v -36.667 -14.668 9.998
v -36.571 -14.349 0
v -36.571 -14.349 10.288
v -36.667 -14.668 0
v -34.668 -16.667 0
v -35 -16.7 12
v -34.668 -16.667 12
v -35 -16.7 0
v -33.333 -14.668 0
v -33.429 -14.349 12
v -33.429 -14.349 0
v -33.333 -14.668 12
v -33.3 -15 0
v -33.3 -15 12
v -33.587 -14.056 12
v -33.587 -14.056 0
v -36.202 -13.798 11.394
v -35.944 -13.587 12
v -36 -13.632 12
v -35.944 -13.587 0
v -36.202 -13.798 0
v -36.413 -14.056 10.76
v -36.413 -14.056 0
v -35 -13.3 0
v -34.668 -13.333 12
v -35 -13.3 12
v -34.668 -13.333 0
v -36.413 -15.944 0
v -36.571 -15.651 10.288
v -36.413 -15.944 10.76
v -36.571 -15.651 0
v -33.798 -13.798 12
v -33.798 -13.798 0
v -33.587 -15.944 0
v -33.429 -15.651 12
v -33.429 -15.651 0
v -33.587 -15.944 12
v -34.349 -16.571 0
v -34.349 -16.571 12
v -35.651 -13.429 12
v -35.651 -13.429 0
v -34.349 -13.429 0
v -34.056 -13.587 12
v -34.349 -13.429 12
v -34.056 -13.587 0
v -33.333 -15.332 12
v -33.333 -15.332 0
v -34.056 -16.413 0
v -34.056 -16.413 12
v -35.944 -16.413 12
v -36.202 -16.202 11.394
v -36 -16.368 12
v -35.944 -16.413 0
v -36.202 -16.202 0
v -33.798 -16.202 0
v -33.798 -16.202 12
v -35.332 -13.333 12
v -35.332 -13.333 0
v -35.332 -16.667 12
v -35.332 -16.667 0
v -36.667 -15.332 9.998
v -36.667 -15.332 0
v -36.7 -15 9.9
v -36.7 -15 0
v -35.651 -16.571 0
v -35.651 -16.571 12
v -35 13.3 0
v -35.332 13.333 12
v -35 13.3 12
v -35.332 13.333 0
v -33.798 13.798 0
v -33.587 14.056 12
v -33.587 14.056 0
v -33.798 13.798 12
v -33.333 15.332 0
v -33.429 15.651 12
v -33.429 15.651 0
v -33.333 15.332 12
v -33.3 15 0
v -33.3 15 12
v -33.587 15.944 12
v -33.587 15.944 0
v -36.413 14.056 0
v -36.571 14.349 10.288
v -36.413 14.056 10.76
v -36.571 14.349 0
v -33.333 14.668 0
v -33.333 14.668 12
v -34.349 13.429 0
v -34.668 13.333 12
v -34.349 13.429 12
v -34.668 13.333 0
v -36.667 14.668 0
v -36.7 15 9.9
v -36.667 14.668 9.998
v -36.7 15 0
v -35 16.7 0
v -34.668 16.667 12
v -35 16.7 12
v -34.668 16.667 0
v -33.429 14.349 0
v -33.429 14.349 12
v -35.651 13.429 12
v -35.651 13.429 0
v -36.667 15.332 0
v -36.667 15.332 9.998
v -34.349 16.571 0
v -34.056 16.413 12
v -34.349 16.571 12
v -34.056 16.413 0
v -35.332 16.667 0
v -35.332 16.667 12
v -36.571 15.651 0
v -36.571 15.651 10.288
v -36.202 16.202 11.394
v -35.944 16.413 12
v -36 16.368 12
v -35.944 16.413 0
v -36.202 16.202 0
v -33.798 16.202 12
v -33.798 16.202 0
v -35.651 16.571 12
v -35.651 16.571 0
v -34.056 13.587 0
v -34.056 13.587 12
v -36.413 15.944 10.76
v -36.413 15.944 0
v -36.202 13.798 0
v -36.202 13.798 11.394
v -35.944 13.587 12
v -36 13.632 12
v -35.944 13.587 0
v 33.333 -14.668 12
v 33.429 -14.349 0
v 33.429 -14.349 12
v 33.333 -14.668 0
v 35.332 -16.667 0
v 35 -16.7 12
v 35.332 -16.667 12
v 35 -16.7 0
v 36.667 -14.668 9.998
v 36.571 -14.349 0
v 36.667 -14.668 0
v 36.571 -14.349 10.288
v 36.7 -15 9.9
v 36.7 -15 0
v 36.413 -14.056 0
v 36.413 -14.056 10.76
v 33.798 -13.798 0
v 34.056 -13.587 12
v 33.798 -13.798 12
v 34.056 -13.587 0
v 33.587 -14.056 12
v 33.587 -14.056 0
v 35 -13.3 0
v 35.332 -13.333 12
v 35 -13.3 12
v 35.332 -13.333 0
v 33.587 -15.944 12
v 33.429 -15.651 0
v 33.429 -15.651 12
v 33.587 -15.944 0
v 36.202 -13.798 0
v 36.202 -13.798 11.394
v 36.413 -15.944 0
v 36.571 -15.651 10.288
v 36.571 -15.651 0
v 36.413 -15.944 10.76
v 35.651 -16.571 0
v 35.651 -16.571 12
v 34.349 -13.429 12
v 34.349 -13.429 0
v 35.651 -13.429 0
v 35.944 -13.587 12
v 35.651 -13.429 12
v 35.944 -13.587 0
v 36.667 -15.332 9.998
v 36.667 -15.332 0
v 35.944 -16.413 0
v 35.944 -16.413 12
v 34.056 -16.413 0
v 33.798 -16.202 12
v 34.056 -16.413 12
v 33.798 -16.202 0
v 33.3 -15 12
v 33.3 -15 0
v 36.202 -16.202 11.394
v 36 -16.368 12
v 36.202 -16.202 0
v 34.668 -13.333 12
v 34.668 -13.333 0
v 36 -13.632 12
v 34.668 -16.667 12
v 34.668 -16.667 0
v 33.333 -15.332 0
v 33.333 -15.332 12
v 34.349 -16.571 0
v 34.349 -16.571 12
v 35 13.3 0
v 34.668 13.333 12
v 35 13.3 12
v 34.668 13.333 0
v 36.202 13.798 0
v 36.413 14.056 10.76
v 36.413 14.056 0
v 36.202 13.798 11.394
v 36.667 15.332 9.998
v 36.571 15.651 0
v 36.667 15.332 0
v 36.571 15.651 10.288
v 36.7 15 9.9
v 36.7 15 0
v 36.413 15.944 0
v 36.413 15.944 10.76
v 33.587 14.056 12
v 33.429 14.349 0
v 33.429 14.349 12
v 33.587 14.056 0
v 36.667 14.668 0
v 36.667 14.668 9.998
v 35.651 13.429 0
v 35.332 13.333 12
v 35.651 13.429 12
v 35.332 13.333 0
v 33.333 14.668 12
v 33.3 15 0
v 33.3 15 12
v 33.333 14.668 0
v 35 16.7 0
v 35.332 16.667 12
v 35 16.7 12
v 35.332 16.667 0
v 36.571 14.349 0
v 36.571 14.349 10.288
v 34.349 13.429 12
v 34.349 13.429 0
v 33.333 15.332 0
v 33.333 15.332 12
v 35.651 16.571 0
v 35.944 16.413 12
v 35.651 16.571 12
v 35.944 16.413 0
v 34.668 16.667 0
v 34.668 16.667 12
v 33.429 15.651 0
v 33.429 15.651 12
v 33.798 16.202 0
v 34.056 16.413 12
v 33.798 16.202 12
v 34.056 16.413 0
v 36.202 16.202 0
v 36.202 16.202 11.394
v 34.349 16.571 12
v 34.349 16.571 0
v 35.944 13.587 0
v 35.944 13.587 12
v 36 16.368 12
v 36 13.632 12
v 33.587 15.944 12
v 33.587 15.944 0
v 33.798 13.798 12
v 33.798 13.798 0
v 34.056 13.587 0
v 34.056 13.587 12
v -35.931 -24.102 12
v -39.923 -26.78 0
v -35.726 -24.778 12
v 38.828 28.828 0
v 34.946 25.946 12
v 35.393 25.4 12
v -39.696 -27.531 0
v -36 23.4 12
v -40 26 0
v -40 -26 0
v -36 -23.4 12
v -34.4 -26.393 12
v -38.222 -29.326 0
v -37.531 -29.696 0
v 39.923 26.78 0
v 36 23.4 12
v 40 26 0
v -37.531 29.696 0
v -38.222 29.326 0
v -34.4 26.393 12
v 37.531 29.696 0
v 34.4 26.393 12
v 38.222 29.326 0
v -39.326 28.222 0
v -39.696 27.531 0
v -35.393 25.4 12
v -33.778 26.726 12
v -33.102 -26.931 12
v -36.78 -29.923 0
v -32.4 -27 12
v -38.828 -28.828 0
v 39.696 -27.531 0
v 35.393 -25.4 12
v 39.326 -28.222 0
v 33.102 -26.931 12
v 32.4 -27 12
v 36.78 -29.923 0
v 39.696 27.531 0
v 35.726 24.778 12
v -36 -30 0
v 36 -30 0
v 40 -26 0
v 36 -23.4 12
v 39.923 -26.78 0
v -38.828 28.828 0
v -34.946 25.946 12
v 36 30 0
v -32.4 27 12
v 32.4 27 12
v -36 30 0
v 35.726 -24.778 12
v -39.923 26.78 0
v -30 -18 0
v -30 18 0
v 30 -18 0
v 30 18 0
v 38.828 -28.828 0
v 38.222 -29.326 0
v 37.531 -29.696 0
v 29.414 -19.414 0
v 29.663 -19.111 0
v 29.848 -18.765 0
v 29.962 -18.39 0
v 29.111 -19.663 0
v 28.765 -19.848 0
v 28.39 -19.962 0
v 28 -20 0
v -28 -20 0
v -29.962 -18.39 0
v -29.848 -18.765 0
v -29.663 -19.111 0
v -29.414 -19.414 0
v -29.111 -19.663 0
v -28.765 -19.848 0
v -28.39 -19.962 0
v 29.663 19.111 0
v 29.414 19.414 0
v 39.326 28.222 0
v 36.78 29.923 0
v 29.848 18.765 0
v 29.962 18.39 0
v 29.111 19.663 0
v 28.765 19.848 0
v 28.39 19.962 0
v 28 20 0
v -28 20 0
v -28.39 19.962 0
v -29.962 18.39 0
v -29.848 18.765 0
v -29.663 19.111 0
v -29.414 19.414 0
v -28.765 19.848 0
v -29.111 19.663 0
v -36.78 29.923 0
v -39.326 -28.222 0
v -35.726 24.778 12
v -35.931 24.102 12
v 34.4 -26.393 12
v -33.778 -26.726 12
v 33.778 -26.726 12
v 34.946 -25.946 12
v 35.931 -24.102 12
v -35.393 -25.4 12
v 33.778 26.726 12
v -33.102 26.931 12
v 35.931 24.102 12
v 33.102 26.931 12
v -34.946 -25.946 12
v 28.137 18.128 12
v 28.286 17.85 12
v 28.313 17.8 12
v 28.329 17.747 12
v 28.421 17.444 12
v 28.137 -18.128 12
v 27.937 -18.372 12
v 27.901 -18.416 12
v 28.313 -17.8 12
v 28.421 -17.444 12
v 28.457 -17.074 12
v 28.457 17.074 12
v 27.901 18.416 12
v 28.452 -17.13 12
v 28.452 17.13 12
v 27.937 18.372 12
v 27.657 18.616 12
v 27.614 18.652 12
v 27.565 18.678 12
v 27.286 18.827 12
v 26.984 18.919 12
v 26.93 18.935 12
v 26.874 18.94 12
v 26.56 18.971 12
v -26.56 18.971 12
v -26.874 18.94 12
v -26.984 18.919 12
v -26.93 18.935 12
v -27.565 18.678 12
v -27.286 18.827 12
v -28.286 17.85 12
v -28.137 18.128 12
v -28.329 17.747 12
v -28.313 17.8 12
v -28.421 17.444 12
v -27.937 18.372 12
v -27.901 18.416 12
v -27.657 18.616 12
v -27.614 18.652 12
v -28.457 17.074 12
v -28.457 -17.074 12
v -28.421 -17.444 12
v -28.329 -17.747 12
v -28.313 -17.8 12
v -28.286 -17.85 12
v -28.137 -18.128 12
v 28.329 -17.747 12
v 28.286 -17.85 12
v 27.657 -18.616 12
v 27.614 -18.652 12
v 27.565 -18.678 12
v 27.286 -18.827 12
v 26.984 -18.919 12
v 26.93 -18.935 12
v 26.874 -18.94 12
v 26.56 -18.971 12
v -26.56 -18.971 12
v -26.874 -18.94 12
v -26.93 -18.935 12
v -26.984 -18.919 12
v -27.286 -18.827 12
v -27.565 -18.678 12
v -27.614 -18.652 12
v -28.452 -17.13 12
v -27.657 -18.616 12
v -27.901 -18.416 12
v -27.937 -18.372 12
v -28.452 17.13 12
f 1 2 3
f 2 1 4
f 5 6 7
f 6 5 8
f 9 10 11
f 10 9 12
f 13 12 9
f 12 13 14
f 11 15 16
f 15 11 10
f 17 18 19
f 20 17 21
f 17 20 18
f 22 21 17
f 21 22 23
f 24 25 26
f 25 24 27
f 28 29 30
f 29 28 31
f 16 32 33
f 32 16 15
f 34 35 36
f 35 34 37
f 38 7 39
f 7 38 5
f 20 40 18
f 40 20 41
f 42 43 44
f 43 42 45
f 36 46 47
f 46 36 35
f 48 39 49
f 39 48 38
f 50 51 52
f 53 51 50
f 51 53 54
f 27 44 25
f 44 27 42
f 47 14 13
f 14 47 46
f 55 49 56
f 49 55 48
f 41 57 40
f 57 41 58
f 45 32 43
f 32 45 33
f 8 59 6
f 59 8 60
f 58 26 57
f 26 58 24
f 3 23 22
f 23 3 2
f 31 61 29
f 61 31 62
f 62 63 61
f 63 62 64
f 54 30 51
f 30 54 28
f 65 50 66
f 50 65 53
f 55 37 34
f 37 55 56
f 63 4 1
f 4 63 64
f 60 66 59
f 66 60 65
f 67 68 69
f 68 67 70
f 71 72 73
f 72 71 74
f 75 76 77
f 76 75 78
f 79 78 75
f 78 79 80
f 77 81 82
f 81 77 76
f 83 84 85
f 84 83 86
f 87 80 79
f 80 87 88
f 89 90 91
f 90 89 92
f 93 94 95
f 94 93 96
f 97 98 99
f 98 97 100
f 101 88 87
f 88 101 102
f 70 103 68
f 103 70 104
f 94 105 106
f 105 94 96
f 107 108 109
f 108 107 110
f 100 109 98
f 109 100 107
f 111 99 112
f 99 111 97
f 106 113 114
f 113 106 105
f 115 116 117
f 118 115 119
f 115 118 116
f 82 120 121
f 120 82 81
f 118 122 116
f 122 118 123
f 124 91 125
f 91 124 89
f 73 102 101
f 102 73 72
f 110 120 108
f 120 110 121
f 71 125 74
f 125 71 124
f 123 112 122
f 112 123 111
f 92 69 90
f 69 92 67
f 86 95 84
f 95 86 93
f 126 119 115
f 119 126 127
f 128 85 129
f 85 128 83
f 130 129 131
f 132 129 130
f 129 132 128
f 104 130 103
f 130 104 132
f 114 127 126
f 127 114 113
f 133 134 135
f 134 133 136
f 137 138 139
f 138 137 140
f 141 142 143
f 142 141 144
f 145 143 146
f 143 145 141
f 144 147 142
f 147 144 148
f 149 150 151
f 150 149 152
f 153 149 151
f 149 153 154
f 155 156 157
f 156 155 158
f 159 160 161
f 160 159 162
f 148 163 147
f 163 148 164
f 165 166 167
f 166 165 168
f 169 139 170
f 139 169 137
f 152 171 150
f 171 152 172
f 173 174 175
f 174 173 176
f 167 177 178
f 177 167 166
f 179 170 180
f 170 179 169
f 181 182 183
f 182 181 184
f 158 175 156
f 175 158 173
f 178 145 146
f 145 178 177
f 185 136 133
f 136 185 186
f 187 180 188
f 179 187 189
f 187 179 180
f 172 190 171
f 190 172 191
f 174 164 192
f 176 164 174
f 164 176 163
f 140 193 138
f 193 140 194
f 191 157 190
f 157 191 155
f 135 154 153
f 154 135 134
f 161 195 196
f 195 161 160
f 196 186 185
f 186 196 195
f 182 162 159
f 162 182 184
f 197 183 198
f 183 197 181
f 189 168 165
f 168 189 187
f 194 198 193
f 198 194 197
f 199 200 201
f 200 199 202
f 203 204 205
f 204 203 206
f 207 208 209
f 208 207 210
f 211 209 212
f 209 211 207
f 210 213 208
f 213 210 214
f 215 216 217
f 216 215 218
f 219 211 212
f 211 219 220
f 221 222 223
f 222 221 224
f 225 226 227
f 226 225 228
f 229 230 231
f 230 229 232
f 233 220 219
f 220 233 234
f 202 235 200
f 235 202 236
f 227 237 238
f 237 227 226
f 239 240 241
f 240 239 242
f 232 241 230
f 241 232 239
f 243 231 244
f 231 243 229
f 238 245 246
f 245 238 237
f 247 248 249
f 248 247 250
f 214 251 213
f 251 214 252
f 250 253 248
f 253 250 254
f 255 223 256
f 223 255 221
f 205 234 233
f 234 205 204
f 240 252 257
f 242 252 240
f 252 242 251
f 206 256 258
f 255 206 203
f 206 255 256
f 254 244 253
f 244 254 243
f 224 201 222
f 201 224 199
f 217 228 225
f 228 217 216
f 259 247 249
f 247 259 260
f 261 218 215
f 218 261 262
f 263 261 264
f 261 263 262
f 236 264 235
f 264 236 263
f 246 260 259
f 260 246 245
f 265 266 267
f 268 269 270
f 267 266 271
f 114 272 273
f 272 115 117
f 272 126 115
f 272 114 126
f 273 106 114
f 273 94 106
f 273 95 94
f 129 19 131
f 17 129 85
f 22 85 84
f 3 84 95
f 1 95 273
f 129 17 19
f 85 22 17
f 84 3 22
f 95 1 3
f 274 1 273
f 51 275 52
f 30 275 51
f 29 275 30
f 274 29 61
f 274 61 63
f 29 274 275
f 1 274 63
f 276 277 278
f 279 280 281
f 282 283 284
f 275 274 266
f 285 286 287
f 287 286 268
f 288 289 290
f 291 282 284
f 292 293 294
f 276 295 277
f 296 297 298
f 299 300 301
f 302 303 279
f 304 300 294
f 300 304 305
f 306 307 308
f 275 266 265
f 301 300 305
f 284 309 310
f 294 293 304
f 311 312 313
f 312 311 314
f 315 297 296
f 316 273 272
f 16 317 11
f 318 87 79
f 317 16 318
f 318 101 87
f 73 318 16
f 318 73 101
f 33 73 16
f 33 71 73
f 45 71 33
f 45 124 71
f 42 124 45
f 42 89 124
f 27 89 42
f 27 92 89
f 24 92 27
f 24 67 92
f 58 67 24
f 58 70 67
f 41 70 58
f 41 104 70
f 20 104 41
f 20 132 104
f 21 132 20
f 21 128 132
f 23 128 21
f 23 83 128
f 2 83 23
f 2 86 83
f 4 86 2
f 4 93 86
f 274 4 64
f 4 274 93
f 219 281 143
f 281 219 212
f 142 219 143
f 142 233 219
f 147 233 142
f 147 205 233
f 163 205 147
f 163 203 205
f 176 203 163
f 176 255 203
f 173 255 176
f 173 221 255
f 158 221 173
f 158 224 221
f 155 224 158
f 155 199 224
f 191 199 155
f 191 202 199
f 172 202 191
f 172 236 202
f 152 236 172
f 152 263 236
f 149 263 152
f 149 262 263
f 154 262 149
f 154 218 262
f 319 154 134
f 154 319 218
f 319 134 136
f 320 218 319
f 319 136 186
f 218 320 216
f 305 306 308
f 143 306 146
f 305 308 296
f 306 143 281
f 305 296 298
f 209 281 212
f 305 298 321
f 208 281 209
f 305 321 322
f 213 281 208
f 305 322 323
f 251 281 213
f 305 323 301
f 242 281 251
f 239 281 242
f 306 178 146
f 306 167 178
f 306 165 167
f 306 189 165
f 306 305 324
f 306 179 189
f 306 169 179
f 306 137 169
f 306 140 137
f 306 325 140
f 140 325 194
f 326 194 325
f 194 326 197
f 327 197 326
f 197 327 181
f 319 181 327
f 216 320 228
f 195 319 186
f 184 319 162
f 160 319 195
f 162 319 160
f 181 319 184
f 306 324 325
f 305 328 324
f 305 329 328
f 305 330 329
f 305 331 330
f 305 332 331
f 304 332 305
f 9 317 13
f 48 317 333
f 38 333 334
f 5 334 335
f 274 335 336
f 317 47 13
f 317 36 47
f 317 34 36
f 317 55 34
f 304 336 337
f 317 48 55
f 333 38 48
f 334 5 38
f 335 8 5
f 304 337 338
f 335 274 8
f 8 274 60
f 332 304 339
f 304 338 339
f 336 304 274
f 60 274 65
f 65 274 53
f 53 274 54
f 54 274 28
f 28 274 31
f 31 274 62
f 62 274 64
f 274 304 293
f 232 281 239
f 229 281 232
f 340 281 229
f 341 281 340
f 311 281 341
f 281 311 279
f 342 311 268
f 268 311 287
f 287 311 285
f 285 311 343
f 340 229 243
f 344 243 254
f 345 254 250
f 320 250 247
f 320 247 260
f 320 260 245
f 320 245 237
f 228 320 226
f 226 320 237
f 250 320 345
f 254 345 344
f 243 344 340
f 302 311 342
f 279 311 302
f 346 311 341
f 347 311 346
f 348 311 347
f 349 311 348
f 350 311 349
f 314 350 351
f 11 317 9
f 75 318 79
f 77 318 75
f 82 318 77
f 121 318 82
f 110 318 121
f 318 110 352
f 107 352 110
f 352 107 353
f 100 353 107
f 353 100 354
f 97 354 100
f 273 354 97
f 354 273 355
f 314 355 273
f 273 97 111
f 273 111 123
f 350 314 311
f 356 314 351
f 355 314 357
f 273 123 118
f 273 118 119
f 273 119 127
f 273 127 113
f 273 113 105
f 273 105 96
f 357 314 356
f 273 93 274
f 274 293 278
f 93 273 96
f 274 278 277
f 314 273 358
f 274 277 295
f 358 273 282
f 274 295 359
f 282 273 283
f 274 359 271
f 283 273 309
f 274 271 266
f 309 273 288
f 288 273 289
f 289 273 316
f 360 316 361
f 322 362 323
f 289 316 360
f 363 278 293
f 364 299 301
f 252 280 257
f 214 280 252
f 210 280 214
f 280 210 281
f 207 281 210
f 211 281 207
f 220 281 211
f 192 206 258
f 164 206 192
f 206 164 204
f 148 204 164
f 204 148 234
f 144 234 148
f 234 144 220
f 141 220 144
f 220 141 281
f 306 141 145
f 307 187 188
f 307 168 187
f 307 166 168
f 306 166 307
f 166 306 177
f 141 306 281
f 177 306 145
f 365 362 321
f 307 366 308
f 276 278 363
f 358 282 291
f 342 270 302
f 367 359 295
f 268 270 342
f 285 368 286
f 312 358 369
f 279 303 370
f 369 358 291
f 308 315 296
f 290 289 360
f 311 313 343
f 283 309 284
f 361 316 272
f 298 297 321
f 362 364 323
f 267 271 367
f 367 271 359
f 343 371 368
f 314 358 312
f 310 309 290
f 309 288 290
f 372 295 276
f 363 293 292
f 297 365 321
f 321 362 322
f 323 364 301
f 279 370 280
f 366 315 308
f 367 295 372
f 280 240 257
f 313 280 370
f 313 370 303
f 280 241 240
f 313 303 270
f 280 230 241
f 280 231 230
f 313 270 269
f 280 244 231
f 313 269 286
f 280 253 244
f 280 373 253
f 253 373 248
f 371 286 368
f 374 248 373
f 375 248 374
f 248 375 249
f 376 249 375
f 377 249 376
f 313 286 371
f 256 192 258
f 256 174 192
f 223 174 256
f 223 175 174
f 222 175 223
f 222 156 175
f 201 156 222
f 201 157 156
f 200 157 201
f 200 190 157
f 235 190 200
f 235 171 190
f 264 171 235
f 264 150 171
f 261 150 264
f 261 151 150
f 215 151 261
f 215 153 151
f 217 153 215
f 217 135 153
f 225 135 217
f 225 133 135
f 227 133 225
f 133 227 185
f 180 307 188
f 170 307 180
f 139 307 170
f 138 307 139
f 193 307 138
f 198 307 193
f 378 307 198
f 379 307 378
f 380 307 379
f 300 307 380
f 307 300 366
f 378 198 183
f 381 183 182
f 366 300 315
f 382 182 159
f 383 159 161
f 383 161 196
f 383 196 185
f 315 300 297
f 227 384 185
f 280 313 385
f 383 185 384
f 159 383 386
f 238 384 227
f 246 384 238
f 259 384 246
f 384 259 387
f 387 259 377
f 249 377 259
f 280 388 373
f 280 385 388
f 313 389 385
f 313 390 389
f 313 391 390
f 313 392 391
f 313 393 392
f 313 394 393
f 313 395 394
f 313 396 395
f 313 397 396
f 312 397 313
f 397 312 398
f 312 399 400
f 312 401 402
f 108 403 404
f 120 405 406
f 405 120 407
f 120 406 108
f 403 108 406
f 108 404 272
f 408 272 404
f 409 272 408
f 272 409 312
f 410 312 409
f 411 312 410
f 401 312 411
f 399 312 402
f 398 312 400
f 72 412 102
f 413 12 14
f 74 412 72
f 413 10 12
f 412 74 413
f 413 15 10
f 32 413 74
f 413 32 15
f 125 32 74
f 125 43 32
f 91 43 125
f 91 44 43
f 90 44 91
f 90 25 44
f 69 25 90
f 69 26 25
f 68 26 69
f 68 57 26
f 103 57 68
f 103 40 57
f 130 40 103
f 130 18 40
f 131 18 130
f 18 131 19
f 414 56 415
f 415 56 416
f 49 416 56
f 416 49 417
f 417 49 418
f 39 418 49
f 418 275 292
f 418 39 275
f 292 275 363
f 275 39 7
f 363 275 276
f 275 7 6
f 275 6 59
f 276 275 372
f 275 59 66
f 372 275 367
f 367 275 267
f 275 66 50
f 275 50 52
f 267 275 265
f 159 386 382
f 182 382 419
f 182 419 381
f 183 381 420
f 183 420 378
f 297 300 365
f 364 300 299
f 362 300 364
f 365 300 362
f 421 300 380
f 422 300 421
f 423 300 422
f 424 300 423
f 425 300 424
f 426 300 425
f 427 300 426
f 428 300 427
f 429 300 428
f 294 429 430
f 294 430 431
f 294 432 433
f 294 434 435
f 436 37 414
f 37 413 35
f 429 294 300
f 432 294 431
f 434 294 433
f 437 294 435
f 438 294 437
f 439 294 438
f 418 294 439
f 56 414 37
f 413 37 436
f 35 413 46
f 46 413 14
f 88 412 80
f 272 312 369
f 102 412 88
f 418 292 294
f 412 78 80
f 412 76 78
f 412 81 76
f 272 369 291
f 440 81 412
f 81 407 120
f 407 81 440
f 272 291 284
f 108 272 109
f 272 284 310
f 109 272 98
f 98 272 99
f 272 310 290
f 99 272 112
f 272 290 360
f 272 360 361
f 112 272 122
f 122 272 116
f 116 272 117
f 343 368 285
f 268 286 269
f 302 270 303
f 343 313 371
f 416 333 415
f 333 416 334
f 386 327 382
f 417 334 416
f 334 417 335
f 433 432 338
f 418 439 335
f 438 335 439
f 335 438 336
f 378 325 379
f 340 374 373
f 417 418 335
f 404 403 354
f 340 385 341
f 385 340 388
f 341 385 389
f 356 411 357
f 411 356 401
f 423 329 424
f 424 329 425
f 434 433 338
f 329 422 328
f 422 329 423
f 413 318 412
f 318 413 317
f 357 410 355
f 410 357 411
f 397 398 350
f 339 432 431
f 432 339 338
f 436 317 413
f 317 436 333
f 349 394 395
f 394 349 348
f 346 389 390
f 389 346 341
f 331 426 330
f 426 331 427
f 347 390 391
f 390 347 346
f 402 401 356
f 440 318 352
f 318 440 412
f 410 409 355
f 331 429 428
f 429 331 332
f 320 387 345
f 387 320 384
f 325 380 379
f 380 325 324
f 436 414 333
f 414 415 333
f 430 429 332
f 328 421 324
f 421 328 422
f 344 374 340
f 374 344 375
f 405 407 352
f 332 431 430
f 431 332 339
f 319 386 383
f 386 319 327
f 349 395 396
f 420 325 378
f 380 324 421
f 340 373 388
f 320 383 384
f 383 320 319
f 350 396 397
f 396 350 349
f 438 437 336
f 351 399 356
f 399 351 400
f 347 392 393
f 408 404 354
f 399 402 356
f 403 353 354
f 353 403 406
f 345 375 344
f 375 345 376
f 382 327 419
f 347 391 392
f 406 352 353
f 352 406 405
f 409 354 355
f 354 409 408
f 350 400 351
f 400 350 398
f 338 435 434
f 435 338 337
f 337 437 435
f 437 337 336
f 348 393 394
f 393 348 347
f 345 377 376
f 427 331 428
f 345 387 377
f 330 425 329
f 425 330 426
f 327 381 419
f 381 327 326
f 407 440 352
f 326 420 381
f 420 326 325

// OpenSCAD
$fn = 32;

// ----------------------------------------------------------------------
// Display bezel: 80 x 60 mm frame, opening 60x40 mm
// ----------------------------------------------------------------------

// --- parameters (mm) ---
length = 80;              // frame outside length, X
width = 60;               // frame outside width, Y
frame_w = 10;             // frame width
thickness = 12;           // frame thickness
corner_r = 4;             // outside corner radius
chamfer = 0.9;            // outer wall taper
funnel = 0.94;            // inner opening taper
opening_l = 60;           // opening length
opening_w = 40;           // opening width
inner_r = 2;              // opening corner radius
hole_d = 3.4;             // mounting screw clearance
holes_per_side = 2;       // holes per short side
hole_inset = 5;           // hole centre inset from the outside edge

/* rounded-rectangle outlines, generated with loops */
module rounded_ring(l_nom, w_nom, r) {
  hull() {
    for (sx = [-1, 1]) for (sy = [-1, 1])
      translate([sx * (l_nom / 2 - r), sy * (w_nom / 2 - r)]) circle(r = r);
  }
}

difference() {
  /* frame body, drafted so the outer edge is a variable-depth chamfer */
  linear_extrude(height = thickness, scale = chamfer)
    rounded_ring(length, width, corner_r);
  /* viewing opening, drafted the other way for a funnel edge */
  linear_extrude(height = thickness + 2, scale = funnel)
    translate([0, 0, -1]) rounded_ring(opening_l, opening_w, inner_r);
  /* mounting screws through the frame lands */
  for (sx = [-1, 1]) for (i = [1 : holes_per_side])
    translate([sx * (length / 2 - hole_inset),
               (i - (holes_per_side + 1) / 2) * width * 0.5, -1])
      cylinder(h = thickness + 2, d = hole_d);
}
